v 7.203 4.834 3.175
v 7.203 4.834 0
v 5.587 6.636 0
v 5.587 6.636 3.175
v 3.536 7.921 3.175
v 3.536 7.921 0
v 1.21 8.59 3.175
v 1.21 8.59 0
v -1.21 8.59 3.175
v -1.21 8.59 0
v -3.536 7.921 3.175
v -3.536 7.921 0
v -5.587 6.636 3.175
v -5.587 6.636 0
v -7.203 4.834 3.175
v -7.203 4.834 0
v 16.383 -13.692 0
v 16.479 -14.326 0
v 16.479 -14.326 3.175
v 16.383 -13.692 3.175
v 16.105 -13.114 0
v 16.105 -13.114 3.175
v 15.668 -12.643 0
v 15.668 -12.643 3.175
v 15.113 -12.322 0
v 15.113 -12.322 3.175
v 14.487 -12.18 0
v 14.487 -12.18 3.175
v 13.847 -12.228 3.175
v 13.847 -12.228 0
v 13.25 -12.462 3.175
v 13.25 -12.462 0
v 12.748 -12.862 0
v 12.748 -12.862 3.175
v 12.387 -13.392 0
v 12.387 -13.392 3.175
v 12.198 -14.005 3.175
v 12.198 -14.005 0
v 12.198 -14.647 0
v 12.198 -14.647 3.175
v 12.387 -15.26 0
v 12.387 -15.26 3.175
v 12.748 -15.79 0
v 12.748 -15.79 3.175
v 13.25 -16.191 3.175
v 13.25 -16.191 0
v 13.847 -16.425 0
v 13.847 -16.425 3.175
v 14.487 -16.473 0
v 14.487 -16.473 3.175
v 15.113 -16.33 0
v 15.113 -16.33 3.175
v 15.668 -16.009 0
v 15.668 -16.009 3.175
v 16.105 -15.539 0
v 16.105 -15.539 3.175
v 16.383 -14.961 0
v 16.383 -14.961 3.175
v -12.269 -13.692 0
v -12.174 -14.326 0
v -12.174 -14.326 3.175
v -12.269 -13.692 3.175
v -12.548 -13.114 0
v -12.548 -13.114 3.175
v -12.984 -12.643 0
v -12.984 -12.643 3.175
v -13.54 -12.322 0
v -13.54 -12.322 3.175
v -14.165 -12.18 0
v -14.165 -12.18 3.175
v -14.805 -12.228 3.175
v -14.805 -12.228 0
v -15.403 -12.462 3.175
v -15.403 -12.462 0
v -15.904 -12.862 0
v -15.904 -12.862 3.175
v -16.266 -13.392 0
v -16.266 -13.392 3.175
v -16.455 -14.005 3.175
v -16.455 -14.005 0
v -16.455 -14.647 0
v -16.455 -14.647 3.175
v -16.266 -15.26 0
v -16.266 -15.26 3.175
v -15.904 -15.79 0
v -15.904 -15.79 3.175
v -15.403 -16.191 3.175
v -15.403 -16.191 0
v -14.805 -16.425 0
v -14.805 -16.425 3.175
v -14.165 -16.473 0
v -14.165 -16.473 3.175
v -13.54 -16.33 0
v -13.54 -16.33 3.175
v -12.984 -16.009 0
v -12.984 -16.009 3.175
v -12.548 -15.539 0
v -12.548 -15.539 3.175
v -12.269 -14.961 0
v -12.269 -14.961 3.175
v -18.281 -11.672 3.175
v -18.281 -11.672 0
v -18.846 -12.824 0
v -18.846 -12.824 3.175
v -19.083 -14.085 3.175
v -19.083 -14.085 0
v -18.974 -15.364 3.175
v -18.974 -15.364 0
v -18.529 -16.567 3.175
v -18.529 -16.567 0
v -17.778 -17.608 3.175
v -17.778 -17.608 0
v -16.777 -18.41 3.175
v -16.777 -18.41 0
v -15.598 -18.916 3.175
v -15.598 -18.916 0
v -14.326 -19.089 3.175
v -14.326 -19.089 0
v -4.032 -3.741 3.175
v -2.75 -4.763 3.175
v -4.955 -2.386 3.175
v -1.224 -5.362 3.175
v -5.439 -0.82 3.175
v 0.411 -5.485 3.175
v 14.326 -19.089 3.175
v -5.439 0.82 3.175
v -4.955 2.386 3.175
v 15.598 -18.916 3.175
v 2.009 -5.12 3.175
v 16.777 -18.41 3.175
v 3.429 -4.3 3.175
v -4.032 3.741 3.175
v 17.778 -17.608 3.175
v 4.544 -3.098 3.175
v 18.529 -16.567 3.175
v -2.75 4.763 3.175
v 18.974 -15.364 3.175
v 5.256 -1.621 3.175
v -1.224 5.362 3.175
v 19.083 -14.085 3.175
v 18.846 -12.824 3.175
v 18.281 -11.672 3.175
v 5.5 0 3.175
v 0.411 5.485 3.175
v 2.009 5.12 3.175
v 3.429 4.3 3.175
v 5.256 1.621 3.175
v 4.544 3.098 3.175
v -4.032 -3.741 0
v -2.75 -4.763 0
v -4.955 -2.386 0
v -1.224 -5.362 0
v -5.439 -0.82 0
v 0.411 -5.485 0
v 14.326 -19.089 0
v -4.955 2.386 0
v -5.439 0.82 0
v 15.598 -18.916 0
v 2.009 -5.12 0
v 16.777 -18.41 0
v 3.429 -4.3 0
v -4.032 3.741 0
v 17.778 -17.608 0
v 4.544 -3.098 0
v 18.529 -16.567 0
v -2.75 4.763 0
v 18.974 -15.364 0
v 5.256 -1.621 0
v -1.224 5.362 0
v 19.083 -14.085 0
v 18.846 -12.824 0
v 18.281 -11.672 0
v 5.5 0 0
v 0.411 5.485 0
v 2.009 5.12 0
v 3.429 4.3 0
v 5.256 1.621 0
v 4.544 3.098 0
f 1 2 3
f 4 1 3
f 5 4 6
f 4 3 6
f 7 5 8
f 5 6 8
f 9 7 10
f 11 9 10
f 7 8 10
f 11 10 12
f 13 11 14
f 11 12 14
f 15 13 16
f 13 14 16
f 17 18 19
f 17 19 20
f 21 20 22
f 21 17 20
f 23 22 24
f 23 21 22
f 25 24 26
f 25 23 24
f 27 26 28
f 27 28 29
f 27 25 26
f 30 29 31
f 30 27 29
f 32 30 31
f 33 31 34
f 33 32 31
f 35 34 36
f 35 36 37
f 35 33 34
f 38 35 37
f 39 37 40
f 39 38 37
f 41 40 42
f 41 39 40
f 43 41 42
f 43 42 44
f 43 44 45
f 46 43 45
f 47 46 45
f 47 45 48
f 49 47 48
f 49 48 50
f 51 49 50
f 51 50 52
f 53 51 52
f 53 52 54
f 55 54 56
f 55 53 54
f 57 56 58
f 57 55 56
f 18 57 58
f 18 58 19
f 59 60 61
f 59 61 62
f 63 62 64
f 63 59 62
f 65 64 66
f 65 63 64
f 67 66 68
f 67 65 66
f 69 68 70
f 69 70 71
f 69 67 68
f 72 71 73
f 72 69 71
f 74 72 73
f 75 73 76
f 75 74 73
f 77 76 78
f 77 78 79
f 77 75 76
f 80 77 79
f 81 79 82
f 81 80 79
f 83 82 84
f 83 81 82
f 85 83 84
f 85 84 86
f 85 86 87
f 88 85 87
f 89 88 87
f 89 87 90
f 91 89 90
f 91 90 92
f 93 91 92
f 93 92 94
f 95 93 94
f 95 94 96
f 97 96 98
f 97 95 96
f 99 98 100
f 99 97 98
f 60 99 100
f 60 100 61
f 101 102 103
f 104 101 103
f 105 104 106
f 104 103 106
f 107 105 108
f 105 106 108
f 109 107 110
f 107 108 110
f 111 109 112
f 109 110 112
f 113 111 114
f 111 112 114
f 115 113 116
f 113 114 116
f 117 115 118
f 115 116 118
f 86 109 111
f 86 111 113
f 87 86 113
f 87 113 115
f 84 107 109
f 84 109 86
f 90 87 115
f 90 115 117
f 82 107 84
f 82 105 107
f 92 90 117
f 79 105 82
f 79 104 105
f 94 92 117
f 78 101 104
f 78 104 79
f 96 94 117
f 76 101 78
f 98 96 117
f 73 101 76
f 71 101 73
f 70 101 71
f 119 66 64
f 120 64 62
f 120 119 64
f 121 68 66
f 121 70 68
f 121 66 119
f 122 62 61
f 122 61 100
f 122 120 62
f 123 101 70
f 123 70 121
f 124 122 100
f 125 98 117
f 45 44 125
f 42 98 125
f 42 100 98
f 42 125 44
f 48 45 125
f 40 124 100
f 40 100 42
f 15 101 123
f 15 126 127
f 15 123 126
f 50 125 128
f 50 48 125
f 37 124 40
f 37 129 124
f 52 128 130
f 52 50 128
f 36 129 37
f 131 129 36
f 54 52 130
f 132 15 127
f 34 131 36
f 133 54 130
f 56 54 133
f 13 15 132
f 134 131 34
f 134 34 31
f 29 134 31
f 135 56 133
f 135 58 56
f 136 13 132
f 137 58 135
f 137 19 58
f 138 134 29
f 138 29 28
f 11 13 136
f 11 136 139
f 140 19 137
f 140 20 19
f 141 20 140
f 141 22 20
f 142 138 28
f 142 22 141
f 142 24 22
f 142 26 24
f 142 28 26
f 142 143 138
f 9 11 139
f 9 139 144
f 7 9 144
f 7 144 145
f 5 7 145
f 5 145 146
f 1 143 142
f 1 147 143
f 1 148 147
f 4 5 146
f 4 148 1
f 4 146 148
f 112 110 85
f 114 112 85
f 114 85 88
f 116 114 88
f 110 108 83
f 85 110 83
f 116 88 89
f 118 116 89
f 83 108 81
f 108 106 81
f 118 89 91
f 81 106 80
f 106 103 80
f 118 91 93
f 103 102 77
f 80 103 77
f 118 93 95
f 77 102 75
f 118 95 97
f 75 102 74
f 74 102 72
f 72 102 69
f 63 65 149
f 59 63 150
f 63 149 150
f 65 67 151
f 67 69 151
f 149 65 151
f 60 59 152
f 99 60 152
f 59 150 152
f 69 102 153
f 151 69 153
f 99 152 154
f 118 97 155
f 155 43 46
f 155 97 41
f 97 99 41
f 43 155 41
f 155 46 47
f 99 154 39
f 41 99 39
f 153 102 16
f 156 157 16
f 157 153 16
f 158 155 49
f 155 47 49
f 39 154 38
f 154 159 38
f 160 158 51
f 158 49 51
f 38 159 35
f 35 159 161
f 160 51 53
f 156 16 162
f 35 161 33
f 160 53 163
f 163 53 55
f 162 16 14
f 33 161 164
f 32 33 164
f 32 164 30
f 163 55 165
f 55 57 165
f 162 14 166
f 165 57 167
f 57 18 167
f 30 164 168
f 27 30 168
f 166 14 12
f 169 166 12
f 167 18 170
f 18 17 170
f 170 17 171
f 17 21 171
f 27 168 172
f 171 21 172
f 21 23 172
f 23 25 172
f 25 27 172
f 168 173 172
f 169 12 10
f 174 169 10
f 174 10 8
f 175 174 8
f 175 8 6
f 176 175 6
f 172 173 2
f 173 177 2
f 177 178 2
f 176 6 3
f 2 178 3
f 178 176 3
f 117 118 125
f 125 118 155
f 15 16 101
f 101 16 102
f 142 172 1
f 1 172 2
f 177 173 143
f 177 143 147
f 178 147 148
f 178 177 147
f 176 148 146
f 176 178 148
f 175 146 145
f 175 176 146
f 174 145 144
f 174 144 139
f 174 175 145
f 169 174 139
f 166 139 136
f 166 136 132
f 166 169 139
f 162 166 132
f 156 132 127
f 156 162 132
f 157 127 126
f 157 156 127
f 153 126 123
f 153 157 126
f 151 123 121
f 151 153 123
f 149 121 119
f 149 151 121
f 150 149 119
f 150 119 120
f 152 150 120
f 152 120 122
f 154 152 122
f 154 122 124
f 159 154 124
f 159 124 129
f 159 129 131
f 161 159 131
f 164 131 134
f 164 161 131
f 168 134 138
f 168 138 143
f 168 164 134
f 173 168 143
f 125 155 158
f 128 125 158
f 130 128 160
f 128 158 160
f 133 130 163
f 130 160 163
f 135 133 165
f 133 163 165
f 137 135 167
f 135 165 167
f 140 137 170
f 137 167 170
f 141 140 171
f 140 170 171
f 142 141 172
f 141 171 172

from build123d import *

# Parameters (mm, degrees)
F0_R     = 2.15265
F0_R_2   = 5.5
F1_DEPTH = 3.175


with BuildPart() as f1:
    # F0 (on Top) → F1 (new body)
    with BuildSketch(Plane.XY):
        with BuildLine():
            Line((18.280792, -11.672377), (7.203258, 4.834118))
            ThreePointArc((7.203258, 4.834118), (0, 8.675), (-7.203258, 4.834118))
            Line((-7.203258, 4.834118), (-18.280792, -11.672377))
            ThreePointArc((-18.280792, -11.672377), (-18.528679, -16.567053), (-14.326265, -19.088765))
            Line((-14.326265, -19.088765), (14.326265, -19.088765))
            ThreePointArc((14.326265, -19.088765), (18.528679, -16.567053), (18.280792, -11.672377))
        make_face()
        with Locations((-14.326265, -14.326265)):
            Circle(F0_R, mode=Mode.SUBTRACT)
        with Locations((14.326265, -14.326265)):
            Circle(F0_R, mode=Mode.SUBTRACT)
        Circle(F0_R_2, mode=Mode.SUBTRACT)
    extrude(amount=F1_DEPTH)


solid = f1.part
